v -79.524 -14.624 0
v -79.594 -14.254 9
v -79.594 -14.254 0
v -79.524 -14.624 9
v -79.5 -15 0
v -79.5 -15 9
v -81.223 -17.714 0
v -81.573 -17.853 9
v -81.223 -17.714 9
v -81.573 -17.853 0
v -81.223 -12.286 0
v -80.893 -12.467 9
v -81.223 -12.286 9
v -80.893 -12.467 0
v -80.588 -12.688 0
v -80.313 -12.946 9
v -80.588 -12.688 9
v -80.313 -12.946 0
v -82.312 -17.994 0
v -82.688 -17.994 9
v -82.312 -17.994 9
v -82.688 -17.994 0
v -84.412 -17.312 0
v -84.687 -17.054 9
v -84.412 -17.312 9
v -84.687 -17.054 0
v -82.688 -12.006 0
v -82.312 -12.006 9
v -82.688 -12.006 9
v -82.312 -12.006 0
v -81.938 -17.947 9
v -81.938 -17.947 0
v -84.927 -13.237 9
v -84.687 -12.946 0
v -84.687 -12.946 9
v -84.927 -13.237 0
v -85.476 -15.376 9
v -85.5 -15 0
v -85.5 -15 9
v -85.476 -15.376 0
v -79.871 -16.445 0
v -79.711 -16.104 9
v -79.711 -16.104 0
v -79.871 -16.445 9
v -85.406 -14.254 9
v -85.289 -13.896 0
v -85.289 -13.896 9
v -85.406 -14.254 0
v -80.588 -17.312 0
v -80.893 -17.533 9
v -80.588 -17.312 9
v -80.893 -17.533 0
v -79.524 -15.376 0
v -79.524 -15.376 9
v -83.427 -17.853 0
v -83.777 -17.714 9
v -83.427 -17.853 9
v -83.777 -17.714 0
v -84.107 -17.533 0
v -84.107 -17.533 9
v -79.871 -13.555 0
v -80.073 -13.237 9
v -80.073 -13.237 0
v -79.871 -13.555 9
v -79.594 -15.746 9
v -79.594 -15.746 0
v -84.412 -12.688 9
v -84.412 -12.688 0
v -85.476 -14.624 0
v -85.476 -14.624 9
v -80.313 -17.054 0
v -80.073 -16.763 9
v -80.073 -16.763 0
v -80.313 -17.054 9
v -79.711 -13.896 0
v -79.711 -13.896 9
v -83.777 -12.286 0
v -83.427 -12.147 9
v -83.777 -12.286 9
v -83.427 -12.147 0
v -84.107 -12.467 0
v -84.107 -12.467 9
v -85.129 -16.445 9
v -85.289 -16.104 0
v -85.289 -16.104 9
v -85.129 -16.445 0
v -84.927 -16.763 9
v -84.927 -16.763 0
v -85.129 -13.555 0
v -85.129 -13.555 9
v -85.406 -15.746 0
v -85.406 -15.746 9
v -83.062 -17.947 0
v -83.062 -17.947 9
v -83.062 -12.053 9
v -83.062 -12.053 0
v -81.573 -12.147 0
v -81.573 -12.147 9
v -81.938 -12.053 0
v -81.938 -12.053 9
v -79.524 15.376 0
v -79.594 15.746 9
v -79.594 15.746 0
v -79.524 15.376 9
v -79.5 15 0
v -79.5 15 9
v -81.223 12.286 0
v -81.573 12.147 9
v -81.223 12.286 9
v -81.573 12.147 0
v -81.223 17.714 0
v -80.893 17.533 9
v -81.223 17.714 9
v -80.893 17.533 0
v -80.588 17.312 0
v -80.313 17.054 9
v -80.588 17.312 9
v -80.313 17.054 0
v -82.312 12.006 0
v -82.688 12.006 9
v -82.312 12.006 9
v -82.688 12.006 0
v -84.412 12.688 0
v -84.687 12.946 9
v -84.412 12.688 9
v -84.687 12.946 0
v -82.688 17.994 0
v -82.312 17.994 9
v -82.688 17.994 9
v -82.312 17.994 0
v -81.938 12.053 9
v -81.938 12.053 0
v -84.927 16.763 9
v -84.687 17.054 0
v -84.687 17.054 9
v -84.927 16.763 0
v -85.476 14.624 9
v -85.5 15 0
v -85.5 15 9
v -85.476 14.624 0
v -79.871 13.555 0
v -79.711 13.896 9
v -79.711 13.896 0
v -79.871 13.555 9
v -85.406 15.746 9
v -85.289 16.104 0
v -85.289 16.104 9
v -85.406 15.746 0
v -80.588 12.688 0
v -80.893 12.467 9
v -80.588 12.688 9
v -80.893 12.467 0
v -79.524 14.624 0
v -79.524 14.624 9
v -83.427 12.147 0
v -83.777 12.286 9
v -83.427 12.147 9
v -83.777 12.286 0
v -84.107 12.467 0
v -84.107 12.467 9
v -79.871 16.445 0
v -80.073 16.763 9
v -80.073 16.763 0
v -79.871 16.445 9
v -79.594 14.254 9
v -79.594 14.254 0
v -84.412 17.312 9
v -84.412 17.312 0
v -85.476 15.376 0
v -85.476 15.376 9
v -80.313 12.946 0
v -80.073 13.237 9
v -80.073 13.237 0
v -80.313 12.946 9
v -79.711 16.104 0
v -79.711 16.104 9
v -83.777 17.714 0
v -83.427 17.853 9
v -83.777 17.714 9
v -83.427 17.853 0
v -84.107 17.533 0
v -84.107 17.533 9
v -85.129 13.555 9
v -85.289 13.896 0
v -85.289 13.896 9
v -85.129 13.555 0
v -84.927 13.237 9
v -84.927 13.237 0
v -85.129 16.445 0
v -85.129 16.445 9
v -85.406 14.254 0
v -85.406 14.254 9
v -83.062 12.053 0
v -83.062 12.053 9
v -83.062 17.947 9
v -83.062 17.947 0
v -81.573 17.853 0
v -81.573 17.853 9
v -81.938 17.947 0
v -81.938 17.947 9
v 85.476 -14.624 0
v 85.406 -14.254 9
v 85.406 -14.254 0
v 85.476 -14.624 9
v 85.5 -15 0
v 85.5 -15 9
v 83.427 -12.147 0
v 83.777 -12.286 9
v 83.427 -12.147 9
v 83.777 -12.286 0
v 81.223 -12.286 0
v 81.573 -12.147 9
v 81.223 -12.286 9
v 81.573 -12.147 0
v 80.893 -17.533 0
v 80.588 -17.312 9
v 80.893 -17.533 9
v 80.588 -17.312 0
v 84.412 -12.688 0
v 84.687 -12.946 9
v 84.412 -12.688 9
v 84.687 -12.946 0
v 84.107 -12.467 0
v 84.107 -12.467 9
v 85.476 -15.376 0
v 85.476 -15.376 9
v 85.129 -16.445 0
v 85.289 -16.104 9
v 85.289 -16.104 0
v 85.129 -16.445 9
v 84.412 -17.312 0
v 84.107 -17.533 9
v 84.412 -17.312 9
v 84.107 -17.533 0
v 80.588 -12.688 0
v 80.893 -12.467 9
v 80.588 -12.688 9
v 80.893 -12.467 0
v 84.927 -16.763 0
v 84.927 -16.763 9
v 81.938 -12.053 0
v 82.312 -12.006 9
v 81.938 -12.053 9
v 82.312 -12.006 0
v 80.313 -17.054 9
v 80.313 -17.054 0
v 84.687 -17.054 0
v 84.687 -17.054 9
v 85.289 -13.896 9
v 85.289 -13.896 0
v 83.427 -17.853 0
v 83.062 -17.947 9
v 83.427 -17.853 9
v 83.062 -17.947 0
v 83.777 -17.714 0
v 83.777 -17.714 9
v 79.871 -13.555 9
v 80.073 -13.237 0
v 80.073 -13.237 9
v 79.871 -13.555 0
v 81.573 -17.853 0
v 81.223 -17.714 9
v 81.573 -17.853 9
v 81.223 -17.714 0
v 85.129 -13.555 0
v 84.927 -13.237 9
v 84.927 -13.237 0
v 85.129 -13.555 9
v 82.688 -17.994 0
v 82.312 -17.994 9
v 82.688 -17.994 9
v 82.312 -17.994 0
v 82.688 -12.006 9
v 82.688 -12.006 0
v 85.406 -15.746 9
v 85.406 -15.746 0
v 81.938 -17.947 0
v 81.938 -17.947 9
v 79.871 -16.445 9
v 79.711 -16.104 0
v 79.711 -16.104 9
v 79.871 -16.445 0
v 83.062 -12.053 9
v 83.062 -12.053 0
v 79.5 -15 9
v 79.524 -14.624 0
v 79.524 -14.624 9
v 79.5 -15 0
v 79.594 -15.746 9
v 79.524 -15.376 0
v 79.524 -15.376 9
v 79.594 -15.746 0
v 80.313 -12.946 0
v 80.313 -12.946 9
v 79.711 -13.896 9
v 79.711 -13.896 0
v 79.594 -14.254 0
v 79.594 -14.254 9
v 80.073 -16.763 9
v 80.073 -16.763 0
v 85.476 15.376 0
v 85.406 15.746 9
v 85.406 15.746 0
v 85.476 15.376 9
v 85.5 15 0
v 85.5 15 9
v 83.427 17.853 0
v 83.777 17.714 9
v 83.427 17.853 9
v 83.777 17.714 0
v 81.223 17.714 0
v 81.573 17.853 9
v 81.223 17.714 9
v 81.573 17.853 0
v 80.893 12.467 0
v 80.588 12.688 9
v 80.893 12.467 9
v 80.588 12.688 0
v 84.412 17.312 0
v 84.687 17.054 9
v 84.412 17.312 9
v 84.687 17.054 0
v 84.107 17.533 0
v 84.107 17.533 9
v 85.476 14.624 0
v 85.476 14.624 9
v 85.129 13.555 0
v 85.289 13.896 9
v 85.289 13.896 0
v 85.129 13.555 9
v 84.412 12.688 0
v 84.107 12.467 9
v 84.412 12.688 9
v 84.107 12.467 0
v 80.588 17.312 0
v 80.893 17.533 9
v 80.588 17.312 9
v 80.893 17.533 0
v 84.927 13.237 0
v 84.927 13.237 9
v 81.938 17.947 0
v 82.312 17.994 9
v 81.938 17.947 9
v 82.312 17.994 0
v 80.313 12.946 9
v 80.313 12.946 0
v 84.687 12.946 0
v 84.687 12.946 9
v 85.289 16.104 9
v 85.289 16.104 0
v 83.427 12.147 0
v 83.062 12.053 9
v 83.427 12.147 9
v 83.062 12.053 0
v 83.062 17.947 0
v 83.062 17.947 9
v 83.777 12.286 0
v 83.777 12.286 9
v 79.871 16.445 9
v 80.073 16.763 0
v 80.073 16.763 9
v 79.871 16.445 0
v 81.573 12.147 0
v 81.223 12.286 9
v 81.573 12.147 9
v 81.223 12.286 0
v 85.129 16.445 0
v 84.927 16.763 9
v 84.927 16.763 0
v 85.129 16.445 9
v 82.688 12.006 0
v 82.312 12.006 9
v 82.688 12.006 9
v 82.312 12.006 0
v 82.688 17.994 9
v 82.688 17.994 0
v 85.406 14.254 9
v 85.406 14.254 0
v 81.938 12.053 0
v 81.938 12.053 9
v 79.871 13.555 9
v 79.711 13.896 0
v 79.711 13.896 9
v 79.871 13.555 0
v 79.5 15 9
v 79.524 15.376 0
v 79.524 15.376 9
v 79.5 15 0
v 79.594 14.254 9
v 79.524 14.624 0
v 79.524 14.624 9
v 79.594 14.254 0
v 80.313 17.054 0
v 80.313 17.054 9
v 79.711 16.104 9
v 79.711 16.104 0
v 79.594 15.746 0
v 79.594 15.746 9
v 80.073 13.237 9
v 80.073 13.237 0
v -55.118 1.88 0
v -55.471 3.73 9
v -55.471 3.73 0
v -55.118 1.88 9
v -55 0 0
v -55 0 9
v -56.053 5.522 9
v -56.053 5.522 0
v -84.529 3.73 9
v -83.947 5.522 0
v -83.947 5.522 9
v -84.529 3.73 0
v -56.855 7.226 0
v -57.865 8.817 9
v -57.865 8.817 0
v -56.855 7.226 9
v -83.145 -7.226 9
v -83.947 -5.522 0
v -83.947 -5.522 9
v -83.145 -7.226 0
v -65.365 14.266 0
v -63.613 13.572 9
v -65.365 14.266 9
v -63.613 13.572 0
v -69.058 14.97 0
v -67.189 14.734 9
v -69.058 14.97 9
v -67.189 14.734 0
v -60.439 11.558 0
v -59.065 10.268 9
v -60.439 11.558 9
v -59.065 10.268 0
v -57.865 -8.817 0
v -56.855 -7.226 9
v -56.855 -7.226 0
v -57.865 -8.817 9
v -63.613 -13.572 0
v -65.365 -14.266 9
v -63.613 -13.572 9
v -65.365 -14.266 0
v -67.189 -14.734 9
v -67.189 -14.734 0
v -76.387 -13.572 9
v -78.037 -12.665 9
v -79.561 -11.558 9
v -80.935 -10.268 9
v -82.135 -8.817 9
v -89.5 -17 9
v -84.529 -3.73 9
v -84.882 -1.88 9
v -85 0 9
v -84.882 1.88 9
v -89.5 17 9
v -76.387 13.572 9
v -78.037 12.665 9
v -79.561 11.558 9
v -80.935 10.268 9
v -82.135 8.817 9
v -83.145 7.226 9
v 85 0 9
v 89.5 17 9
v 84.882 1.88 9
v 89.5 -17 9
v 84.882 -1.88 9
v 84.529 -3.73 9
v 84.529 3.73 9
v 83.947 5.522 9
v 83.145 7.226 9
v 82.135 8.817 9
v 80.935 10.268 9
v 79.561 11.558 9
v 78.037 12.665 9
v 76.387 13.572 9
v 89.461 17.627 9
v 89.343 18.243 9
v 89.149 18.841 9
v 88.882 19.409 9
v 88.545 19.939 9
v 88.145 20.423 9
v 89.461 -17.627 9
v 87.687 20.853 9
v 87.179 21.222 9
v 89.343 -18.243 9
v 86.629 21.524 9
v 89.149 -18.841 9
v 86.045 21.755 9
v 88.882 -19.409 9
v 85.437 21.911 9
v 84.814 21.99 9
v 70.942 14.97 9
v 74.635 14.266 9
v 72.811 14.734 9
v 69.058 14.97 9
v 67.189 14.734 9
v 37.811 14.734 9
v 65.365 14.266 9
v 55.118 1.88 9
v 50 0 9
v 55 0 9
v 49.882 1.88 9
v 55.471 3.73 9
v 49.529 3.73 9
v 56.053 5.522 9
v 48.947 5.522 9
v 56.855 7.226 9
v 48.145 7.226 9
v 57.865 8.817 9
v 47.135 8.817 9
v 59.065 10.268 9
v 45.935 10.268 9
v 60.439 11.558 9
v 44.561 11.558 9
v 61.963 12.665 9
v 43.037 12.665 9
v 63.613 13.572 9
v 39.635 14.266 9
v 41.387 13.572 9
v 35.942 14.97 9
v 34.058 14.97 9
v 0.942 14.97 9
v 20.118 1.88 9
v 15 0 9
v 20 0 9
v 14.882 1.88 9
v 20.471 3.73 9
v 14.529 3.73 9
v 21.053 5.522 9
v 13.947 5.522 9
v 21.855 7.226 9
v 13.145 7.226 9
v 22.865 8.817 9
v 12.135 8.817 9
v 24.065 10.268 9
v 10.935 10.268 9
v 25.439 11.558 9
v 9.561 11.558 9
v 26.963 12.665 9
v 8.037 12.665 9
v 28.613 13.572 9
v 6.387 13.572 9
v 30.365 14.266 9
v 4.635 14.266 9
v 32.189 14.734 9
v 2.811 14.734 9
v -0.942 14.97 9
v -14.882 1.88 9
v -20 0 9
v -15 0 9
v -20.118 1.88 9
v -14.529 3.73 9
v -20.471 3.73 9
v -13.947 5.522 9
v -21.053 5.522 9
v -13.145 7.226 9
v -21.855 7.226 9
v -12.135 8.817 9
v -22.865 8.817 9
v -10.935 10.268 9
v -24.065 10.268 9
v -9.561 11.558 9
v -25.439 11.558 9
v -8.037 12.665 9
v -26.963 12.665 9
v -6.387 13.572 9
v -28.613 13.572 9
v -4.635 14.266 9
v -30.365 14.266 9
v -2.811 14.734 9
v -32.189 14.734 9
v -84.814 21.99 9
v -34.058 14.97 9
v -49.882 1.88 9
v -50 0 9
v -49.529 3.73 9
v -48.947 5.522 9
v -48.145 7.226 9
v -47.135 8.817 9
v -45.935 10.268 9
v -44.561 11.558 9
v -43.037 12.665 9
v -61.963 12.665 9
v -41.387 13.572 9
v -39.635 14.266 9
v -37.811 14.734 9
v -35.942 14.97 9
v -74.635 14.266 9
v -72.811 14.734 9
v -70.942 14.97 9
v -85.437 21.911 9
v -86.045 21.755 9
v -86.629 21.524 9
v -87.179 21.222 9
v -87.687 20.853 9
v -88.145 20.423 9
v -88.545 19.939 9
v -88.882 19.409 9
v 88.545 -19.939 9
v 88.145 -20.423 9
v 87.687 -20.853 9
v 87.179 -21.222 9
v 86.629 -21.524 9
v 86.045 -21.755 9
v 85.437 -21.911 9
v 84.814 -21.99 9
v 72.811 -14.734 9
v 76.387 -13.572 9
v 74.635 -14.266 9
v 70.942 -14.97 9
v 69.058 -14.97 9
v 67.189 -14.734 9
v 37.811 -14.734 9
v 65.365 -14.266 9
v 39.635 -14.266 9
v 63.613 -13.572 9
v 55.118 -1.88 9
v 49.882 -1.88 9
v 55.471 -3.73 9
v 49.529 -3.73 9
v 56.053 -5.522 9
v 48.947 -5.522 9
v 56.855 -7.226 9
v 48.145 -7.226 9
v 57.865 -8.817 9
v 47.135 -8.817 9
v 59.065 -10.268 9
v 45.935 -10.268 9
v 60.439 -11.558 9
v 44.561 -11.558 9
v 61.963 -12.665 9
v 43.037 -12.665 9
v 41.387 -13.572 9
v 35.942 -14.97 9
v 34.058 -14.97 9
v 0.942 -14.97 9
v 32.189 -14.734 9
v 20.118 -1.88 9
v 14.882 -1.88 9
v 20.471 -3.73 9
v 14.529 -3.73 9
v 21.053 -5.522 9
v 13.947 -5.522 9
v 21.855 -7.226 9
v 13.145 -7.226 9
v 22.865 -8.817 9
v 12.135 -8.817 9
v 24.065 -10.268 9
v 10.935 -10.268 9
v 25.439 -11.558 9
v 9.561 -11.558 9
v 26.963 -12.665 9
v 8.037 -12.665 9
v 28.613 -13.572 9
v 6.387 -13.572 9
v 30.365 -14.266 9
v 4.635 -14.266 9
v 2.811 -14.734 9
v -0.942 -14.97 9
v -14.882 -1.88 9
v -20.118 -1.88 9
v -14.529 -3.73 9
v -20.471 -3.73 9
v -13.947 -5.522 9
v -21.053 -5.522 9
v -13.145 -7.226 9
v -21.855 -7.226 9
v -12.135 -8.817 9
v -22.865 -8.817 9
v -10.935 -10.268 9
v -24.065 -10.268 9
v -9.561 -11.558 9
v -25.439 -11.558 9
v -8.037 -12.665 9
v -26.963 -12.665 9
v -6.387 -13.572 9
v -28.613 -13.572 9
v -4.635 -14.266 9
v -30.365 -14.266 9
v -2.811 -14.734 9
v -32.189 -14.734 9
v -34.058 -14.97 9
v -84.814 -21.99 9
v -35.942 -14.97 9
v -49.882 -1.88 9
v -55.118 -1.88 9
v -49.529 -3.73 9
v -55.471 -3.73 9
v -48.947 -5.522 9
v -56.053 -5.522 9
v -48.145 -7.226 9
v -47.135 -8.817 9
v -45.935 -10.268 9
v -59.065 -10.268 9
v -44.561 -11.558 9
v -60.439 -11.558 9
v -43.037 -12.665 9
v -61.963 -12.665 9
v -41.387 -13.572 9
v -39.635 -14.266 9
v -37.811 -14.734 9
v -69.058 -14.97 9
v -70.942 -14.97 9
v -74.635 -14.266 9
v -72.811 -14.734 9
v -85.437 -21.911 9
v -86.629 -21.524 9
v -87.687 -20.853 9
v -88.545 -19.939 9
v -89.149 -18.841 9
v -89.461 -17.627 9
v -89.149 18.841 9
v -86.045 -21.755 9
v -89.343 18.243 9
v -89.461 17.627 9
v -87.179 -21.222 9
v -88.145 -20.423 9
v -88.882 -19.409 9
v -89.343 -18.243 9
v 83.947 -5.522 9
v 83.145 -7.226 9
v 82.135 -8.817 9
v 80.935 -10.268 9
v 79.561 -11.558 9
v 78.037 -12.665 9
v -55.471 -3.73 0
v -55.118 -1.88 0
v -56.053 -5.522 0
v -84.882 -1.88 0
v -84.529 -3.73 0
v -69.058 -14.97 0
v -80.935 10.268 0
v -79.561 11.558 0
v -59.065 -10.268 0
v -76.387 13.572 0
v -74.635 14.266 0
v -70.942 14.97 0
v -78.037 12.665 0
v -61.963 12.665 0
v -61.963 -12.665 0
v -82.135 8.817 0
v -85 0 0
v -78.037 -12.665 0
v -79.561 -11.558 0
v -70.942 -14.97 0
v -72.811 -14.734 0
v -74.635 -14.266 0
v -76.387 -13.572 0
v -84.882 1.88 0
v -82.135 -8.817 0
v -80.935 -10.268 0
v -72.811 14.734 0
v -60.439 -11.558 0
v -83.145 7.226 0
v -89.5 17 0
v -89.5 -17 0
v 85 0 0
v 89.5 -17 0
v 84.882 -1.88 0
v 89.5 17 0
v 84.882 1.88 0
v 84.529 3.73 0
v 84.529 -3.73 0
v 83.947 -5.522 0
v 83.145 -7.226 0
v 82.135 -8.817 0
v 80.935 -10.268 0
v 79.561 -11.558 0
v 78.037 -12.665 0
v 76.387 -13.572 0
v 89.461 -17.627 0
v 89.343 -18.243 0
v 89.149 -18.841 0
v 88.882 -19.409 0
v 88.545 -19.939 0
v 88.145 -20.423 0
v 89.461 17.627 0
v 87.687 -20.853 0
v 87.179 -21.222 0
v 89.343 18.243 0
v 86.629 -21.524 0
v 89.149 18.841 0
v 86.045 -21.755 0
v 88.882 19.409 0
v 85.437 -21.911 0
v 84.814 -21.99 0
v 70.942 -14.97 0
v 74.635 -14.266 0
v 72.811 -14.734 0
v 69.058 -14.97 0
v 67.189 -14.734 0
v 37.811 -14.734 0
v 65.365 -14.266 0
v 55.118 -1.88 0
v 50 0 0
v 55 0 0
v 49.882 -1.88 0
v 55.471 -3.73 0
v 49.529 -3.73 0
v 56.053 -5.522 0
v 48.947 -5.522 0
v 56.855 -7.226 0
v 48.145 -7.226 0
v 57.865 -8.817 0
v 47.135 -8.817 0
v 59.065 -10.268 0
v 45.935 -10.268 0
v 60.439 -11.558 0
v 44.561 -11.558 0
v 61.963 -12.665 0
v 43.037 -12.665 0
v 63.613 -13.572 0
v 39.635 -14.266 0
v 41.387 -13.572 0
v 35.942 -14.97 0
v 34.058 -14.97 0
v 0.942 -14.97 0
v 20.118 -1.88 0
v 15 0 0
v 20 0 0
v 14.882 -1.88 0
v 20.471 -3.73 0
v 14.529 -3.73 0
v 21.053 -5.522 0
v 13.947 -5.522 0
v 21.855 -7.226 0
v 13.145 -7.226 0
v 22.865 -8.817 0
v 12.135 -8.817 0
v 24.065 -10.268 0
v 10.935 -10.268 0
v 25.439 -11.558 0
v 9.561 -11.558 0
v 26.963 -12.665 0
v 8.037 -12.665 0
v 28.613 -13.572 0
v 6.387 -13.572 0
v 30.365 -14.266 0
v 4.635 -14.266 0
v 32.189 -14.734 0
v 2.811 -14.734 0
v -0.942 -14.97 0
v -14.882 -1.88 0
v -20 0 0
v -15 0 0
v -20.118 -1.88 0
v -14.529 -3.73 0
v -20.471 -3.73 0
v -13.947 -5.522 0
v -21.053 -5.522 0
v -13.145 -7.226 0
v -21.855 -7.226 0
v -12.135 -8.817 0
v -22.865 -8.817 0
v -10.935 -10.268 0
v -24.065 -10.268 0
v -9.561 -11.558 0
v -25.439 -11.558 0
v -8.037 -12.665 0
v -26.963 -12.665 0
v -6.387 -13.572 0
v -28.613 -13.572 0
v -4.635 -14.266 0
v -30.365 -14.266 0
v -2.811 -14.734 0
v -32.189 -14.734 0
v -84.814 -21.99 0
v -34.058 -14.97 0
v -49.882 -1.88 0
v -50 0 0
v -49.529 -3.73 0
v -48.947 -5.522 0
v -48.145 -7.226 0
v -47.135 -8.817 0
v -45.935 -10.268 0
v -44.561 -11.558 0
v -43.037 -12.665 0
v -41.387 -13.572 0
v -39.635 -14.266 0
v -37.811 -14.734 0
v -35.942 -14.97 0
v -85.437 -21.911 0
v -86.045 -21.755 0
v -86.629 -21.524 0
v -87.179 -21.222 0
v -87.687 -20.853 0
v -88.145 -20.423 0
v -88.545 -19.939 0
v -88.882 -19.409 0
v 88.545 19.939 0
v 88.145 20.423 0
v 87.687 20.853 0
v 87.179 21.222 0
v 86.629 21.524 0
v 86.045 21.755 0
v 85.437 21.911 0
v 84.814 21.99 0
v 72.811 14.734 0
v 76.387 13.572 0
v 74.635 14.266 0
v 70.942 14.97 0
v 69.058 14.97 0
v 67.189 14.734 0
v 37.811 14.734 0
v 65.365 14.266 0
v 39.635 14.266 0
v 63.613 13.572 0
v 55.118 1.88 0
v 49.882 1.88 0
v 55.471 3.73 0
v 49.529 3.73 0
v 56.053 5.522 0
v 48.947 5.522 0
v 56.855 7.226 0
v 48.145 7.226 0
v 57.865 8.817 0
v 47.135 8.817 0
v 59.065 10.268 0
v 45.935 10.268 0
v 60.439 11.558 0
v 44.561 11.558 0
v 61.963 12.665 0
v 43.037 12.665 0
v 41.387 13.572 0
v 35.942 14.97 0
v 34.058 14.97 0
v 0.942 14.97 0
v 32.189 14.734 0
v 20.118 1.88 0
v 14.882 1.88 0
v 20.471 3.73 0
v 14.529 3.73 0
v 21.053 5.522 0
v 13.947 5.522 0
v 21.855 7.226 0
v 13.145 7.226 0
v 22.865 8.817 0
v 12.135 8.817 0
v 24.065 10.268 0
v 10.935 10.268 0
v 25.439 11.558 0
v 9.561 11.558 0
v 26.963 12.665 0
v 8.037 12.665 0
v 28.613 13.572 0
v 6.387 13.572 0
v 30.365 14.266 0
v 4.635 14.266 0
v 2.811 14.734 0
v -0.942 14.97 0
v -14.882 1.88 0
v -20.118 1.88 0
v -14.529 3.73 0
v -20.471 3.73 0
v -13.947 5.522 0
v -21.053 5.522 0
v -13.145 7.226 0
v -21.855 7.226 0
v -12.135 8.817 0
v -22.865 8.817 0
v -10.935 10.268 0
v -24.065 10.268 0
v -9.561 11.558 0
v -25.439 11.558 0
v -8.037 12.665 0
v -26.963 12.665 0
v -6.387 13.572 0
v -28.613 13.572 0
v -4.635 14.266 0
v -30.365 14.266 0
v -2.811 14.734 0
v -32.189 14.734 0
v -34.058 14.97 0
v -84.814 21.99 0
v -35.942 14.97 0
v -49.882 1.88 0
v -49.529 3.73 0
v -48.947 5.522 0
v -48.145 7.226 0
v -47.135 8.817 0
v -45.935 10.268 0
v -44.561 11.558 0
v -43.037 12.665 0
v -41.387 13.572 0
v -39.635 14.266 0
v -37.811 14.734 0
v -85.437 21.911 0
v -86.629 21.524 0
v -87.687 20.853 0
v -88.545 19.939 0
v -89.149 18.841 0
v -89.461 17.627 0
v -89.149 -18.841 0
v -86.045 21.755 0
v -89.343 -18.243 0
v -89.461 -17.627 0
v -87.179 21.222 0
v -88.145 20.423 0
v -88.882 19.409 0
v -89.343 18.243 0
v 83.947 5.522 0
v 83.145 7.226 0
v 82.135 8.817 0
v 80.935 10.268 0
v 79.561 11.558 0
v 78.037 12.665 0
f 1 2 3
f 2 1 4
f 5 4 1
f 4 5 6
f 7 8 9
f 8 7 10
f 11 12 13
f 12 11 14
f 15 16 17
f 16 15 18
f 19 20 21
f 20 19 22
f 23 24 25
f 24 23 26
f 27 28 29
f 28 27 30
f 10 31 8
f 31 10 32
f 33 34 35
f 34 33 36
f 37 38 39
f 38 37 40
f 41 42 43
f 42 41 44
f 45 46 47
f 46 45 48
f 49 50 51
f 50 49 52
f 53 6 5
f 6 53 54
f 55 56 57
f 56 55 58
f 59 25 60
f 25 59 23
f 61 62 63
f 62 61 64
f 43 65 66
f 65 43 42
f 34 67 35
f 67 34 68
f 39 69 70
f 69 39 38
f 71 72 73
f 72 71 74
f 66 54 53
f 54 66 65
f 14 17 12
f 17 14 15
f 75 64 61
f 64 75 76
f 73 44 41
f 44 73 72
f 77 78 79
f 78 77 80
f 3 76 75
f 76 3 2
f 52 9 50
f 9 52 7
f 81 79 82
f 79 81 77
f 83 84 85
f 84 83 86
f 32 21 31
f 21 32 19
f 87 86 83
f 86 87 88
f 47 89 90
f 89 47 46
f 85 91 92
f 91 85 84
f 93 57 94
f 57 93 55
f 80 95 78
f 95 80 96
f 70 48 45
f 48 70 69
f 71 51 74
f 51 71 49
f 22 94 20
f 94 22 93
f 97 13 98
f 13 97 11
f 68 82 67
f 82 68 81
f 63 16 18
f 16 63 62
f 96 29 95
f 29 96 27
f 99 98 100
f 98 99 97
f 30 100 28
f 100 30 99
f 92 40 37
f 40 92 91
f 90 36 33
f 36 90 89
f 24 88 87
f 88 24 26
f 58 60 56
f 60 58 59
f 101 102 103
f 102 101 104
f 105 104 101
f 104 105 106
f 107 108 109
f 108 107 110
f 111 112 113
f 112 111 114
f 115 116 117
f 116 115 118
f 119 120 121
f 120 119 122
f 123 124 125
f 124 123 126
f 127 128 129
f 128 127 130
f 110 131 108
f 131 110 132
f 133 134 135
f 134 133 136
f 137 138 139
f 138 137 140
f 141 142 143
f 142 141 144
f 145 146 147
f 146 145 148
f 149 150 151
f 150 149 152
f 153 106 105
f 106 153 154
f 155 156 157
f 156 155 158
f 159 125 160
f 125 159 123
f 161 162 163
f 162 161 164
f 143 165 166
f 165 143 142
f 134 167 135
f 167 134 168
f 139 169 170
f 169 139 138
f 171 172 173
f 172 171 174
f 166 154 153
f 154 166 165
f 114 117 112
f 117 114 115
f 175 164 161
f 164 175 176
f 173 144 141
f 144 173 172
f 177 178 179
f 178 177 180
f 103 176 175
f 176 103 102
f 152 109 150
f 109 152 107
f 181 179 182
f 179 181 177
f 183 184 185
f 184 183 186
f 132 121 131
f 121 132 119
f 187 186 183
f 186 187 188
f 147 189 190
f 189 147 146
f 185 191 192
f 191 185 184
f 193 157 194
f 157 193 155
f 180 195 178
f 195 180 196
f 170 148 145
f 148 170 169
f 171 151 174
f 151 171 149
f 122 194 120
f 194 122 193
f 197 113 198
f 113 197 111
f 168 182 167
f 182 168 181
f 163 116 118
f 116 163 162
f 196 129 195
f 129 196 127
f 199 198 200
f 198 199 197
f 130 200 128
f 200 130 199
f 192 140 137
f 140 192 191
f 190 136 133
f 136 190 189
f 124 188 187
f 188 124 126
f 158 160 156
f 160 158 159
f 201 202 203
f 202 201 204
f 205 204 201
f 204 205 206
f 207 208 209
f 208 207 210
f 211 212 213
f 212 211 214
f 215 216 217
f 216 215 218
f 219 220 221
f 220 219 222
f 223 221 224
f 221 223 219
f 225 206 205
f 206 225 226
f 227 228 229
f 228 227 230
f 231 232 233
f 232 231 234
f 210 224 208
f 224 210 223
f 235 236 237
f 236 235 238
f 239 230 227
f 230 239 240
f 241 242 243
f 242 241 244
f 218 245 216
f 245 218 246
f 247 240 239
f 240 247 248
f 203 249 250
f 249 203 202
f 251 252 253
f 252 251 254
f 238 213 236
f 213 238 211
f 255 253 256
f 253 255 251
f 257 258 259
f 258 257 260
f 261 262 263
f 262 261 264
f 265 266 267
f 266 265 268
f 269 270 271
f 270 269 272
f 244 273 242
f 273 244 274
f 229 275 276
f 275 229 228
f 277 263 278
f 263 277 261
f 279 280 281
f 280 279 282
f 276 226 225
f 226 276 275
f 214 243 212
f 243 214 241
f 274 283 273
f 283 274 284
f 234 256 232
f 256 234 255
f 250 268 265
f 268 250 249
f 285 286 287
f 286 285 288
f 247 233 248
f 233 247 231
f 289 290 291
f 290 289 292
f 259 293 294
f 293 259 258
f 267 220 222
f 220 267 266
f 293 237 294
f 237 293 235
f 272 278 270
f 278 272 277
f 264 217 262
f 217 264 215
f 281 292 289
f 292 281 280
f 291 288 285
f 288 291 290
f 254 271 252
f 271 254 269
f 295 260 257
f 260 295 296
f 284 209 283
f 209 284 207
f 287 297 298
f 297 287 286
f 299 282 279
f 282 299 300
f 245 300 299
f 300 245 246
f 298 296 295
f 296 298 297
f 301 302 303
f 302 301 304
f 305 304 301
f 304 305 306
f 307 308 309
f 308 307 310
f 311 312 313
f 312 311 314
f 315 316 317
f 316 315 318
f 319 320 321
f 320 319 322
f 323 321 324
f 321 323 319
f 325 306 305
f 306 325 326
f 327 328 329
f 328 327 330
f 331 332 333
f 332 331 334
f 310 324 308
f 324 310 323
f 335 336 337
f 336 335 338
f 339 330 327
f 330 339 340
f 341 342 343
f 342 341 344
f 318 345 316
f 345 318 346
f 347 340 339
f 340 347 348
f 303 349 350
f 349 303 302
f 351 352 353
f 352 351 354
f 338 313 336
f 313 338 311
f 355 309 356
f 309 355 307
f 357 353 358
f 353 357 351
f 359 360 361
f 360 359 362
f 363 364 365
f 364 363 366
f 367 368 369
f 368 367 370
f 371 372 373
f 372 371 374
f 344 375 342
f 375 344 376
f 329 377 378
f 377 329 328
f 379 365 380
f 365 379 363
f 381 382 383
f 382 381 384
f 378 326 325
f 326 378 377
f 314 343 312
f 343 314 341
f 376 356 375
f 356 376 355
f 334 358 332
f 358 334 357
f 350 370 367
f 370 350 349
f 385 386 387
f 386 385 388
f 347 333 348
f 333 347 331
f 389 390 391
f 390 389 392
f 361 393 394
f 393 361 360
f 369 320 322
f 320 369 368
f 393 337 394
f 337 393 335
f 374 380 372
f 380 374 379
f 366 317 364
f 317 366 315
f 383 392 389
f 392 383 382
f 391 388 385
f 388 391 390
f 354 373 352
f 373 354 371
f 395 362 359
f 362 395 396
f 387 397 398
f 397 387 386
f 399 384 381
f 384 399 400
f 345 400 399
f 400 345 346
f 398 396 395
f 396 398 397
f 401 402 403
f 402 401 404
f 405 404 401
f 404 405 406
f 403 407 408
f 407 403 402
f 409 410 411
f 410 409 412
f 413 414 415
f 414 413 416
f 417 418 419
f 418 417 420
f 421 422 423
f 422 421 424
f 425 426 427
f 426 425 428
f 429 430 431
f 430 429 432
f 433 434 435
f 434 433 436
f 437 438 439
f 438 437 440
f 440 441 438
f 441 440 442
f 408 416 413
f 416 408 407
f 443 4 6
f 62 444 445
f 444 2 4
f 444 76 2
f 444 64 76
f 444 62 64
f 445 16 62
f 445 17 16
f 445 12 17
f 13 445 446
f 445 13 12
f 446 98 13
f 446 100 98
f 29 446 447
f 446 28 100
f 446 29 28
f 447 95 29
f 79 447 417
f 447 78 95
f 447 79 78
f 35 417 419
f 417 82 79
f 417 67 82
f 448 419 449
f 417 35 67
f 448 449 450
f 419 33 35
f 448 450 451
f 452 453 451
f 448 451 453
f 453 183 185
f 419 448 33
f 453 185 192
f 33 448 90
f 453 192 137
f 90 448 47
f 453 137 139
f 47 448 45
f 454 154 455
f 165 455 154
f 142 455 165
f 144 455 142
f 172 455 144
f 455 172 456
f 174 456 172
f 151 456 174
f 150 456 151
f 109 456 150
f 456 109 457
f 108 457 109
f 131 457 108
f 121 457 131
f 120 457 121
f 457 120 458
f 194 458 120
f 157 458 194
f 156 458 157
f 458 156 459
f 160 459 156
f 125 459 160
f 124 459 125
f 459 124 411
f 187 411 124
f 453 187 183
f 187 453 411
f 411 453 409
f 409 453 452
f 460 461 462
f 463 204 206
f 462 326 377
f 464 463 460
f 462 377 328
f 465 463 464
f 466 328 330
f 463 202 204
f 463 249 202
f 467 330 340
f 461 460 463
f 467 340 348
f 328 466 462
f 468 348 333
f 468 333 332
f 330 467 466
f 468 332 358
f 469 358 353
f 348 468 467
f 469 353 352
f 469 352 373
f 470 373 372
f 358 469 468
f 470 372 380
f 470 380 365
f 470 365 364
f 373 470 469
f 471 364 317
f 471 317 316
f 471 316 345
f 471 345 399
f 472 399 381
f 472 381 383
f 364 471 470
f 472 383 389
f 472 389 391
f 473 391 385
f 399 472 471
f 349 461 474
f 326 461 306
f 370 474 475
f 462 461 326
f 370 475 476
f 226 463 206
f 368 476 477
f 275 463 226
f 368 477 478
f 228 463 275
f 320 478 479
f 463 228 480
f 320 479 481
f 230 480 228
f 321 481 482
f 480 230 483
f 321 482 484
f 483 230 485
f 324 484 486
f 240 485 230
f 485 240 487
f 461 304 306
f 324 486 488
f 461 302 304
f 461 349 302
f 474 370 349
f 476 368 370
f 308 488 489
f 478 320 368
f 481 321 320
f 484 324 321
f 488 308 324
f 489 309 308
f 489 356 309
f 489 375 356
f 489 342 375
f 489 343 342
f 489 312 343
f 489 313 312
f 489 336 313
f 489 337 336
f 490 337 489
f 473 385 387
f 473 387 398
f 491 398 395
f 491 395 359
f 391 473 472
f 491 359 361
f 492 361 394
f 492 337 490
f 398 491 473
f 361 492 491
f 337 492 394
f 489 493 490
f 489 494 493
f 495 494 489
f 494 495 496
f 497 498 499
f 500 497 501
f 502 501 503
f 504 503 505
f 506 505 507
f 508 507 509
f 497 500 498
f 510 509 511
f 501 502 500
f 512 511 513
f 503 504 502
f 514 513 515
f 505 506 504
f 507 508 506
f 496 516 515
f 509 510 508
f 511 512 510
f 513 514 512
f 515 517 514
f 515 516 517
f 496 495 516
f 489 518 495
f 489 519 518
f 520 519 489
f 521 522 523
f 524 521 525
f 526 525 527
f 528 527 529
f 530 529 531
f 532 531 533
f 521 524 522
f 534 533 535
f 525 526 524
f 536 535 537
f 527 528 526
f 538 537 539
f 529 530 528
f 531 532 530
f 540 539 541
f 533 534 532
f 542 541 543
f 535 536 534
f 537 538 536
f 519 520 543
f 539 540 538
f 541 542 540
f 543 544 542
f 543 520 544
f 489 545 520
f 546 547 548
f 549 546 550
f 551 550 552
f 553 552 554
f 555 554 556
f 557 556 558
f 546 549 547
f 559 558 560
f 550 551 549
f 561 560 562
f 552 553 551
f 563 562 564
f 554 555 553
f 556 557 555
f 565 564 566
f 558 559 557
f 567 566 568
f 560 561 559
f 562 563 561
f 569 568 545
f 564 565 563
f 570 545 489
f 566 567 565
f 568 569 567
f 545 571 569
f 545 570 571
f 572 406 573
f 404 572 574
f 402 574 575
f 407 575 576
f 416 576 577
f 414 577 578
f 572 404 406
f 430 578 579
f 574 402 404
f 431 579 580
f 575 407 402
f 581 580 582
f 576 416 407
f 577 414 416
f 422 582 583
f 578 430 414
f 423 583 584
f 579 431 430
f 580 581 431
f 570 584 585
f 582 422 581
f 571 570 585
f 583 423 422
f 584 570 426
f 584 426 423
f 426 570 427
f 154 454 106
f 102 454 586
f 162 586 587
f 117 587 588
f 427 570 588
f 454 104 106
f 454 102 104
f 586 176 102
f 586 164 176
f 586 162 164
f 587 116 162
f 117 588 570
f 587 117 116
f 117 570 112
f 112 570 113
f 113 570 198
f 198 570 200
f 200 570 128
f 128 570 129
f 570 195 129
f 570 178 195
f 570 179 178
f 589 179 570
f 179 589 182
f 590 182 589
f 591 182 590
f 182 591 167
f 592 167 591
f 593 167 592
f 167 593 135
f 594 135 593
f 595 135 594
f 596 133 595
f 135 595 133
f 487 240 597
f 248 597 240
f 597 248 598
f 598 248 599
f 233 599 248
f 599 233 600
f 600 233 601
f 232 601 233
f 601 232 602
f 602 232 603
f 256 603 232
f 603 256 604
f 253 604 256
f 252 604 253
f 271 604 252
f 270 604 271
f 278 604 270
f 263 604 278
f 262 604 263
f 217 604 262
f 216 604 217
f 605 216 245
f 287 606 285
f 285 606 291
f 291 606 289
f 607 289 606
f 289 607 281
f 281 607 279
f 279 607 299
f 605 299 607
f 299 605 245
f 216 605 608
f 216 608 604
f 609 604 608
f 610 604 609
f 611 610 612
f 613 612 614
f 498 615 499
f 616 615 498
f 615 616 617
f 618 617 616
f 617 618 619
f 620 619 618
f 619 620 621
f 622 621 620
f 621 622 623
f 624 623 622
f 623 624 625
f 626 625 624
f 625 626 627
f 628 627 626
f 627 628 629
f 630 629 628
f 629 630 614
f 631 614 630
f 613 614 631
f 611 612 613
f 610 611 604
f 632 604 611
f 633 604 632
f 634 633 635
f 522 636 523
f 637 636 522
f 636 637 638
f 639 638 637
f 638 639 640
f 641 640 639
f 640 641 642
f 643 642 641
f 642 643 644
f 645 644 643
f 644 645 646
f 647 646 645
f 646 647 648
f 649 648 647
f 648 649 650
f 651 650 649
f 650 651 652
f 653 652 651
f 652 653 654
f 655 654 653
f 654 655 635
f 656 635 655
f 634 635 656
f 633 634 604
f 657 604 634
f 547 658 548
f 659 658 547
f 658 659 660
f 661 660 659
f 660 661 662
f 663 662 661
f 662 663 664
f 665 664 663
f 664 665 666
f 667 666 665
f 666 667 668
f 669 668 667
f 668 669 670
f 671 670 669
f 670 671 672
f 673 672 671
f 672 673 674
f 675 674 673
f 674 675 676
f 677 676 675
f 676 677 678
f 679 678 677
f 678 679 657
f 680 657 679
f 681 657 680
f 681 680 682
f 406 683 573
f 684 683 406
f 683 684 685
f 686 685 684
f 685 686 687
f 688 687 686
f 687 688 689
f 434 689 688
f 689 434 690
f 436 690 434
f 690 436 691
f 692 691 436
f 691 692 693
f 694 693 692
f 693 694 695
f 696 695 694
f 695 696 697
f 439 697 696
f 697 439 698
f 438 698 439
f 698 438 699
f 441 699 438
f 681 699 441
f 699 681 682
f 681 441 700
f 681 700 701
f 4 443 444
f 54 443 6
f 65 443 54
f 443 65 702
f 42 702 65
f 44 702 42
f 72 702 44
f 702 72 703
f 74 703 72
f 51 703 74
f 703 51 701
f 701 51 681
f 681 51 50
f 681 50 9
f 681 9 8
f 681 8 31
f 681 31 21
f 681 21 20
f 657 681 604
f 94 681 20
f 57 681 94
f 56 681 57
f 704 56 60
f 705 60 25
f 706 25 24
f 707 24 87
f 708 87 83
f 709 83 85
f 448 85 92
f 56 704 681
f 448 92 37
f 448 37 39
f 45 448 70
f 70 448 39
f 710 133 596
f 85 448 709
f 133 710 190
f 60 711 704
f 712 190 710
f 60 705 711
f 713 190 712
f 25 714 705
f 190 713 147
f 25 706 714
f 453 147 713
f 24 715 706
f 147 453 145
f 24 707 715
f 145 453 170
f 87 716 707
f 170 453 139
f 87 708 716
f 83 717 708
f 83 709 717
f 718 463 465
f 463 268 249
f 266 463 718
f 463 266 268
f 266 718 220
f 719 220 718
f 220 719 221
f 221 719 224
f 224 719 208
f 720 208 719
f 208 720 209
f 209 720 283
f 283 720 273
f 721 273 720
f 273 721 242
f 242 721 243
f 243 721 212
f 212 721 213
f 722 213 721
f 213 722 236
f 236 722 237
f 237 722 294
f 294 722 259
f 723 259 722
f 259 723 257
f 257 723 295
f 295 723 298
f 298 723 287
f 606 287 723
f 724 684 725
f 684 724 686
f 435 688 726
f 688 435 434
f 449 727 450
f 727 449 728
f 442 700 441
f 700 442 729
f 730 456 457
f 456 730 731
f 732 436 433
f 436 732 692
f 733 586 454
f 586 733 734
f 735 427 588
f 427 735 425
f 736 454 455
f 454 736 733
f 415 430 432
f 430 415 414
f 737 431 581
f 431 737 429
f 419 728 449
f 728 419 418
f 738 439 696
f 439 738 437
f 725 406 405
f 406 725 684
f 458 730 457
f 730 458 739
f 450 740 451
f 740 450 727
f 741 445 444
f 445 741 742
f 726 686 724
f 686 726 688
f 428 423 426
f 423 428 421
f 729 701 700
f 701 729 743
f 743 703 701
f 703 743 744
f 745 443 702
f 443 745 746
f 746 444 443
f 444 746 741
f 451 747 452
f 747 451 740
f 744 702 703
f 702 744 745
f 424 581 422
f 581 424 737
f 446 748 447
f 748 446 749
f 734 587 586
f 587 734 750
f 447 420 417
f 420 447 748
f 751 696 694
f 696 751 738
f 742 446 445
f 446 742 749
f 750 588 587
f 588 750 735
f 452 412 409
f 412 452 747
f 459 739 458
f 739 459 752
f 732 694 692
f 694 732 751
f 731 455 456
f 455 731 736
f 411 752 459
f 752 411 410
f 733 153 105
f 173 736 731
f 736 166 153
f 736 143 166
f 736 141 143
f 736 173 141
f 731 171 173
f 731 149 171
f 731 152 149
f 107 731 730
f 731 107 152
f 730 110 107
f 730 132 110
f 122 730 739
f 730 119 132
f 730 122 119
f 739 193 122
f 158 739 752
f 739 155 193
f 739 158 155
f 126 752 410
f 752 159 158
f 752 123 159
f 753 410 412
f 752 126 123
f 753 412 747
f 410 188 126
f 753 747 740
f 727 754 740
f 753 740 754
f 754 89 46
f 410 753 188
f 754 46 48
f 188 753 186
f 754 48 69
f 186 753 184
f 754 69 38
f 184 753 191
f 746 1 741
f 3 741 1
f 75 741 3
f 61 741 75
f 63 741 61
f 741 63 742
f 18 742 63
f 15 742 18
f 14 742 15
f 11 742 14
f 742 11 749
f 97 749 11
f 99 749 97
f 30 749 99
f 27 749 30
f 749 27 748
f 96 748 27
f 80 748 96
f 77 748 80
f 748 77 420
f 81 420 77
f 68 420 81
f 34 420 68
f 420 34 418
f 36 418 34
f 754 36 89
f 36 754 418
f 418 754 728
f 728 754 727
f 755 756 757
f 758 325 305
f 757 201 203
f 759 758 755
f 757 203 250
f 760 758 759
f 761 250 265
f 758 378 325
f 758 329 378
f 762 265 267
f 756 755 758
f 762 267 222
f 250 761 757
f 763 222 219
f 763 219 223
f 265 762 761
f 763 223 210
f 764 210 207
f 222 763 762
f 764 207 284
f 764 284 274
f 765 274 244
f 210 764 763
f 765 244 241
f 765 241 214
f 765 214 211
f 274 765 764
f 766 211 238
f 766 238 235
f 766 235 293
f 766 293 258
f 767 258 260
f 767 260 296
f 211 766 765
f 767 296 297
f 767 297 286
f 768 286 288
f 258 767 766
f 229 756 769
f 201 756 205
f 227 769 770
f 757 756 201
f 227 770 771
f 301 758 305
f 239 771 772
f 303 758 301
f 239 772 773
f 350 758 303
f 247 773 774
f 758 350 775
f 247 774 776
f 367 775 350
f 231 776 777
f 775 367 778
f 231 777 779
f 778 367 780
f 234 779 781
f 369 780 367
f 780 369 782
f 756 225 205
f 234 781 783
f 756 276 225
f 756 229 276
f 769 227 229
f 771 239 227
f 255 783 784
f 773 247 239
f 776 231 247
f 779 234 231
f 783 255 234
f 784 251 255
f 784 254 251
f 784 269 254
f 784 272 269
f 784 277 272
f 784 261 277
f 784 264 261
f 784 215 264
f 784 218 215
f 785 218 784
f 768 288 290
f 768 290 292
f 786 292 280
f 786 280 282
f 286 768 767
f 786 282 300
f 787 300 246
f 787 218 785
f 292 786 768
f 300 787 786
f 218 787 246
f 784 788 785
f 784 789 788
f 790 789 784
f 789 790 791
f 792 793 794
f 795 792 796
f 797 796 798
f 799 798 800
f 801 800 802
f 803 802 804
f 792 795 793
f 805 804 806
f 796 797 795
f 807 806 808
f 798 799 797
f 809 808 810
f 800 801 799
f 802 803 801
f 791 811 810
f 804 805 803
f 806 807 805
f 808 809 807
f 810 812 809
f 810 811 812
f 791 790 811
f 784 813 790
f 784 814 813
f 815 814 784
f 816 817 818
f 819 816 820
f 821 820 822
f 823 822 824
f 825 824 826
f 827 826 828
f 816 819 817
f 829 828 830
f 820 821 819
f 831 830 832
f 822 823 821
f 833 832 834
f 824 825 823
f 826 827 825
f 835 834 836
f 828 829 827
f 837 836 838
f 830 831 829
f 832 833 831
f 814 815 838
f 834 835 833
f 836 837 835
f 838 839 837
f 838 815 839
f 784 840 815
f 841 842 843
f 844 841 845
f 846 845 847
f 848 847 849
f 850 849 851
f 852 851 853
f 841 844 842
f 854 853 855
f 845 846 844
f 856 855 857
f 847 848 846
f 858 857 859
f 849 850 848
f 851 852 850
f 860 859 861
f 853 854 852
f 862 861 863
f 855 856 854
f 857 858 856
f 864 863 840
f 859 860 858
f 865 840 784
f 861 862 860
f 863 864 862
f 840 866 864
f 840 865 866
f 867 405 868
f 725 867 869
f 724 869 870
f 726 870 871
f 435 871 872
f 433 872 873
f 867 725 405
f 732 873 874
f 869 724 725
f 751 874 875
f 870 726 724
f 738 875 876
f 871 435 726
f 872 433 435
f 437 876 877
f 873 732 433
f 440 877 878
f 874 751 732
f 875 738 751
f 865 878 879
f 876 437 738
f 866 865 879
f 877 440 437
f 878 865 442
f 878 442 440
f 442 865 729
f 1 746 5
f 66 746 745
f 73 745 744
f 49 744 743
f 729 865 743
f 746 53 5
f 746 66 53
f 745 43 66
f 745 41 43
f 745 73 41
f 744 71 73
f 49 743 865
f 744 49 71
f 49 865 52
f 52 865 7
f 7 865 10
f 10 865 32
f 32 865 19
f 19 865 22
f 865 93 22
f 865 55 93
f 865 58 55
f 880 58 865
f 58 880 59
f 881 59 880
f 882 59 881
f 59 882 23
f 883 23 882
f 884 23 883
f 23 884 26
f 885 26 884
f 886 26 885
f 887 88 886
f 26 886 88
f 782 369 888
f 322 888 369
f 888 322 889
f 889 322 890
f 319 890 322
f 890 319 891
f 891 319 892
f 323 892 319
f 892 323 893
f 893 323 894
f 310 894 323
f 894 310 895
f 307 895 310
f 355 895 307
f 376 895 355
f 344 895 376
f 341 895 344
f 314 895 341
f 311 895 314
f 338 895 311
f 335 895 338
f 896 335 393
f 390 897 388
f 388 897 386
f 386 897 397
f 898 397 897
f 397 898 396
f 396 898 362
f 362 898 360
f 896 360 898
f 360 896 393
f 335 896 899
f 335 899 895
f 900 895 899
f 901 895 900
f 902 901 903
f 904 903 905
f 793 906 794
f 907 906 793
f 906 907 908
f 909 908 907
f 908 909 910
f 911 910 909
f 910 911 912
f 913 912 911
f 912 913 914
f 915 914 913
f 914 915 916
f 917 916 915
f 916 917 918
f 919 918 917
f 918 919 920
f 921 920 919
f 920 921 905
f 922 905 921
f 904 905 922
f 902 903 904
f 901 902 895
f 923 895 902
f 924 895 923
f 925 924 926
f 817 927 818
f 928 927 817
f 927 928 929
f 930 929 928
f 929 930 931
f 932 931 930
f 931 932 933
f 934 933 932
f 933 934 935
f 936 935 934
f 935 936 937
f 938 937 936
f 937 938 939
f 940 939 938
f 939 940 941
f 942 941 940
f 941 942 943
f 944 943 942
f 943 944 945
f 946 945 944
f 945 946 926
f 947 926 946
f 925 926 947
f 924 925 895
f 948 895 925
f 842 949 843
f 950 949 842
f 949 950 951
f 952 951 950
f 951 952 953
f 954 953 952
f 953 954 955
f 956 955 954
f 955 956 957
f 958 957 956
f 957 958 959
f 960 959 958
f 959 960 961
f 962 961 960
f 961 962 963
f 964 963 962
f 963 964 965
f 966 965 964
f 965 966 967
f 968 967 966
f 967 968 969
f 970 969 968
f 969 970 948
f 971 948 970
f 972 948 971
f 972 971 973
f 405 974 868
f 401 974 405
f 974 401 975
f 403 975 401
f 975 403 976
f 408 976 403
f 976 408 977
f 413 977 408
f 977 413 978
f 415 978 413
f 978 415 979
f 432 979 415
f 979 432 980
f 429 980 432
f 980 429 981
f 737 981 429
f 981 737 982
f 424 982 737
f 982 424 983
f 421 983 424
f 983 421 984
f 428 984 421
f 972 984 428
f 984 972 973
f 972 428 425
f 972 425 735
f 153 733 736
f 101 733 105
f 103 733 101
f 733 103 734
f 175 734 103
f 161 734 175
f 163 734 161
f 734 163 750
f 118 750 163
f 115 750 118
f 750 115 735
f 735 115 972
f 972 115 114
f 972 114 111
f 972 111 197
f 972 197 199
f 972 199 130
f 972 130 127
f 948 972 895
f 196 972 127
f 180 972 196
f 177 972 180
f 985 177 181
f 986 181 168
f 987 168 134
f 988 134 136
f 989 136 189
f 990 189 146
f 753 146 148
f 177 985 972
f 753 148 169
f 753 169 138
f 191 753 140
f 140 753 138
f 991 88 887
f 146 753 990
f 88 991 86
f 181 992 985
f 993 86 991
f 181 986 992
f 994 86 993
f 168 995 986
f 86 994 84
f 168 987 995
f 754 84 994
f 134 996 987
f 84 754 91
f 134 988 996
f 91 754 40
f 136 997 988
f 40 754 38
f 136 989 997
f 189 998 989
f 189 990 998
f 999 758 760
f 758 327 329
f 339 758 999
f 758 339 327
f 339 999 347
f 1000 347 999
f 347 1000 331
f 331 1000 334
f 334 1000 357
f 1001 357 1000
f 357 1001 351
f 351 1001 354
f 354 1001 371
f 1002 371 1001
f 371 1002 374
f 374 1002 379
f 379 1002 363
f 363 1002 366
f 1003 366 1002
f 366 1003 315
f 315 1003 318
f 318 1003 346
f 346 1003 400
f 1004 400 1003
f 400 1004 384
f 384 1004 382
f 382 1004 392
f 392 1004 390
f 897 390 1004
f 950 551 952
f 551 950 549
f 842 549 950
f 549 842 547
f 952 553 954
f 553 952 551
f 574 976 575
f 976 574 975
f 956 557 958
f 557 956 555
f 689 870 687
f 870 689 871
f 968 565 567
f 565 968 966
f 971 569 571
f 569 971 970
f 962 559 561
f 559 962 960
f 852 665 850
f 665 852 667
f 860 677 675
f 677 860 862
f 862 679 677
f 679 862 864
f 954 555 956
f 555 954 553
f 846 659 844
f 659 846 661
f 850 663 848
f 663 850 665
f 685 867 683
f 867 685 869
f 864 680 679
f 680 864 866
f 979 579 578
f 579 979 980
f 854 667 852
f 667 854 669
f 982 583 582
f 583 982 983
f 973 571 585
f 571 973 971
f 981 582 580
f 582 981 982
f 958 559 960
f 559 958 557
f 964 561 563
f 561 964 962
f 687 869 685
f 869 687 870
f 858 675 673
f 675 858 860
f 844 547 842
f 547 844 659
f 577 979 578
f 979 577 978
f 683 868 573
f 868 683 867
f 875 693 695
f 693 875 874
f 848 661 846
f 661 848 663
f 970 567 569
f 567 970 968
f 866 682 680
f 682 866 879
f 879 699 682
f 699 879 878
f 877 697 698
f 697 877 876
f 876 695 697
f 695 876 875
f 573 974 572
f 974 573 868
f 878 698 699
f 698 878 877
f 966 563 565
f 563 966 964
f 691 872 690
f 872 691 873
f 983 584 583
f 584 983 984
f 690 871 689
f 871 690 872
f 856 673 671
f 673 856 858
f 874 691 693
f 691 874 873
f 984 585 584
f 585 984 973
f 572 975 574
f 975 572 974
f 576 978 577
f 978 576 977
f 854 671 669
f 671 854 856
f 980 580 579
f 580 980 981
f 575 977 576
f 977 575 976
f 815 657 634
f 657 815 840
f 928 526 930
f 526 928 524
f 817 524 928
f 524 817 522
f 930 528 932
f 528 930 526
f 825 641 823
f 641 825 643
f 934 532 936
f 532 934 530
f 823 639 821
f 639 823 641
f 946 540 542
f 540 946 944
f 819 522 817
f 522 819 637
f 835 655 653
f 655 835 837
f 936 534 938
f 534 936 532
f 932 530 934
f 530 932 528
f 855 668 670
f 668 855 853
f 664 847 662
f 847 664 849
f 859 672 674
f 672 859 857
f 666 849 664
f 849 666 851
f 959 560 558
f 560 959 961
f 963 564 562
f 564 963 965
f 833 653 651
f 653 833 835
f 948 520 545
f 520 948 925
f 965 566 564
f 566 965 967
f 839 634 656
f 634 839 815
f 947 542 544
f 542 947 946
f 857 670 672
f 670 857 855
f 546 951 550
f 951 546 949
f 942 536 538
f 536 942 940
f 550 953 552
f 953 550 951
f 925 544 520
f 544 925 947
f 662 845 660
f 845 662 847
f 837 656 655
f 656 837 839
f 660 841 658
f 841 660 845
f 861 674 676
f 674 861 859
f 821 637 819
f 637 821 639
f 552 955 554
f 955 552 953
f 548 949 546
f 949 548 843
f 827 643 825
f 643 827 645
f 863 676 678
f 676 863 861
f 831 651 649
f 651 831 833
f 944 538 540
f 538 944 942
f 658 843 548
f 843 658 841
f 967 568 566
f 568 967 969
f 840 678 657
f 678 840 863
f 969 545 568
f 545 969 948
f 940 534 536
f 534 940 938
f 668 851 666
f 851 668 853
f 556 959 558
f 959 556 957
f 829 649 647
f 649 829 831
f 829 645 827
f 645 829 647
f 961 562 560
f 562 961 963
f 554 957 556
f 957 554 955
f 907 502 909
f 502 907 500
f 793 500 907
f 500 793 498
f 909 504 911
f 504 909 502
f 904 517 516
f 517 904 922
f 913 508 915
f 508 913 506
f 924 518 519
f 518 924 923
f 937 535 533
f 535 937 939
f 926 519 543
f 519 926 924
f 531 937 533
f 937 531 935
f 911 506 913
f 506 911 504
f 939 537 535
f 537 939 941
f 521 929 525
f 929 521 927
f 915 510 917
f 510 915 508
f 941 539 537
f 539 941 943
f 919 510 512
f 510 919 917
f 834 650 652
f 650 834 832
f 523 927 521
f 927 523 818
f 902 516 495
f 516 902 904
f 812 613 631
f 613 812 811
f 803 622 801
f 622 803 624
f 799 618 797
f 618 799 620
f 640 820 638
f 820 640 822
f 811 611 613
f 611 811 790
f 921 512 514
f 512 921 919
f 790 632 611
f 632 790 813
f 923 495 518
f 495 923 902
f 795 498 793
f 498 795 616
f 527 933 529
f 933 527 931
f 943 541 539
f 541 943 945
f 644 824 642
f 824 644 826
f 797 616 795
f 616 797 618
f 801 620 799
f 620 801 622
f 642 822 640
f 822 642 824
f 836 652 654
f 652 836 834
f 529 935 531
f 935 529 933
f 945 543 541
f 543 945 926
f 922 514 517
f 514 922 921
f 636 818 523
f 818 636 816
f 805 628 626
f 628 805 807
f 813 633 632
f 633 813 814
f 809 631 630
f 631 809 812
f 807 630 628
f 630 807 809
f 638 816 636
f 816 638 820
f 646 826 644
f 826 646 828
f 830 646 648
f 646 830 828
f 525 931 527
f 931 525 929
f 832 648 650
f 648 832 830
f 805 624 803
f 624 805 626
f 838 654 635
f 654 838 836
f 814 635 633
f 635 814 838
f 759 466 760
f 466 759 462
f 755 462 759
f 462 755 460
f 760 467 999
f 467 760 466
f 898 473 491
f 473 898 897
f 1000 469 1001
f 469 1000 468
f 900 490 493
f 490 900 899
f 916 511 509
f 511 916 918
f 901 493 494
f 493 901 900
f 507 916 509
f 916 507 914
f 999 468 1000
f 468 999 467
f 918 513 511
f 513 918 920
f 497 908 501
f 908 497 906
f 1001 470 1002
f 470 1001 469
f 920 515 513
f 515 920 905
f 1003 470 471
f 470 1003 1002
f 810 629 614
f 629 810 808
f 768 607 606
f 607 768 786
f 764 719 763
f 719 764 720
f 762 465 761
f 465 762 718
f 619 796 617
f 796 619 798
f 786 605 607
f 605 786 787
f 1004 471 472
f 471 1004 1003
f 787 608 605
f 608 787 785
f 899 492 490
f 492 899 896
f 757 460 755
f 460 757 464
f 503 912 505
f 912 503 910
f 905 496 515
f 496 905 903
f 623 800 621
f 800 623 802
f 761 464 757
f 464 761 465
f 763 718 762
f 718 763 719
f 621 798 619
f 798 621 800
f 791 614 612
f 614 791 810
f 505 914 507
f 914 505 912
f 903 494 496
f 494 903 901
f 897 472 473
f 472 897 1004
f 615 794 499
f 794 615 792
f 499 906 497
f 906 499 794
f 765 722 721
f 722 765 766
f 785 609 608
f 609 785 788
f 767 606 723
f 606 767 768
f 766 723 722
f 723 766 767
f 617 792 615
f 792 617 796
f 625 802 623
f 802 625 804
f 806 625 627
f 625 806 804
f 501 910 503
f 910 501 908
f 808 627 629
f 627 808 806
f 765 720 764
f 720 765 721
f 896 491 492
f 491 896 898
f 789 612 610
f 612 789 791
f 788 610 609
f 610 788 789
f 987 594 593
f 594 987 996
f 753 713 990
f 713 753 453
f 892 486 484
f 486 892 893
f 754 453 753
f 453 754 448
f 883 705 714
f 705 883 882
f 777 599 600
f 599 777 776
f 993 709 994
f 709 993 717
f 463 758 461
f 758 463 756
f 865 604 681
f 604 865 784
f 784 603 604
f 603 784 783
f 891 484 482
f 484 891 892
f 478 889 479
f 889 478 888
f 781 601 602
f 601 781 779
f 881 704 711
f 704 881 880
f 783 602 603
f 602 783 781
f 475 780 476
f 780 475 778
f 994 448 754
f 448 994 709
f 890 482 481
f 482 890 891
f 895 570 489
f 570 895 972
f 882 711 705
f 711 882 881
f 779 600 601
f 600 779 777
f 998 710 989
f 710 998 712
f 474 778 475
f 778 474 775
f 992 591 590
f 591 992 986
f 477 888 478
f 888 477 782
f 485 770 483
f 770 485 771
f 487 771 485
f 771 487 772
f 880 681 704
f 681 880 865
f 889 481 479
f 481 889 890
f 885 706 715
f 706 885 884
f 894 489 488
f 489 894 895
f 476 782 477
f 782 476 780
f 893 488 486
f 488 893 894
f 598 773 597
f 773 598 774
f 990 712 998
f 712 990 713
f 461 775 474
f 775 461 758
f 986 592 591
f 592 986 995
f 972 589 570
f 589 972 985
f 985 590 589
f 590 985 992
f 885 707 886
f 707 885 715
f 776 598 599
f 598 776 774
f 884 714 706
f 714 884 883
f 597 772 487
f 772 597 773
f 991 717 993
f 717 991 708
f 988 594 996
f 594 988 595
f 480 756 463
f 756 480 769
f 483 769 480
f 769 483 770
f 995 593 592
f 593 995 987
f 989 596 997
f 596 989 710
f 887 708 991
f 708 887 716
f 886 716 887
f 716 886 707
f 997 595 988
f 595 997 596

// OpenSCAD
$fn = 50;

difference() {
	union() {
		hull() {
			translate(v = [-84.5, 17.0, 0]) {
				cylinder(h = 9, r = 5);
			}
			translate(v = [84.5, 17.0, 0]) {
				cylinder(h = 9, r = 5);
			}
			translate(v = [-84.5, -17.0, 0]) {
				cylinder(h = 9, r = 5);
			}
			translate(v = [84.5, -17.0, 0]) {
				cylinder(h = 9, r = 5);
			}
		}
	}
	union() {
		translate(v = [-82.5, -15.0, -100.0]) {
			cylinder(h = 200, r = 3.0);
		}
		translate(v = [-82.5, 15.0, -100.0]) {
			cylinder(h = 200, r = 3.0);
		}
		translate(v = [82.5, -15.0, -100.0]) {
			cylinder(h = 200, r = 3.0);
		}
		translate(v = [82.5, 15.0, -100.0]) {
			cylinder(h = 200, r = 3.0);
		}
		translate(v = [-82.5, -15.0, -100.0]) {
			cylinder(h = 200, r = 1.5);
		}
		translate(v = [-82.5, 15.0, -100.0]) {
			cylinder(h = 200, r = 1.5);
		}
		translate(v = [82.5, -15.0, -100.0]) {
			cylinder(h = 200, r = 1.5);
		}
		translate(v = [82.5, 15.0, -100.0]) {
			cylinder(h = 200, r = 1.5);
		}
		translate(v = [-70.0, 0, 0.0]) {
			cylinder(h = 9, r = 15.0);
		}
		translate(v = [-35.0, 0, 0.0]) {
			cylinder(h = 9, r = 15.0);
		}
		cylinder(h = 9, r = 15.0);
		translate(v = [35.0, 0, 0.0]) {
			cylinder(h = 9, r = 15.0);
		}
		translate(v = [70.0, 0, 0.0]) {
			cylinder(h = 9, r = 15.0);
		}
	}
}
